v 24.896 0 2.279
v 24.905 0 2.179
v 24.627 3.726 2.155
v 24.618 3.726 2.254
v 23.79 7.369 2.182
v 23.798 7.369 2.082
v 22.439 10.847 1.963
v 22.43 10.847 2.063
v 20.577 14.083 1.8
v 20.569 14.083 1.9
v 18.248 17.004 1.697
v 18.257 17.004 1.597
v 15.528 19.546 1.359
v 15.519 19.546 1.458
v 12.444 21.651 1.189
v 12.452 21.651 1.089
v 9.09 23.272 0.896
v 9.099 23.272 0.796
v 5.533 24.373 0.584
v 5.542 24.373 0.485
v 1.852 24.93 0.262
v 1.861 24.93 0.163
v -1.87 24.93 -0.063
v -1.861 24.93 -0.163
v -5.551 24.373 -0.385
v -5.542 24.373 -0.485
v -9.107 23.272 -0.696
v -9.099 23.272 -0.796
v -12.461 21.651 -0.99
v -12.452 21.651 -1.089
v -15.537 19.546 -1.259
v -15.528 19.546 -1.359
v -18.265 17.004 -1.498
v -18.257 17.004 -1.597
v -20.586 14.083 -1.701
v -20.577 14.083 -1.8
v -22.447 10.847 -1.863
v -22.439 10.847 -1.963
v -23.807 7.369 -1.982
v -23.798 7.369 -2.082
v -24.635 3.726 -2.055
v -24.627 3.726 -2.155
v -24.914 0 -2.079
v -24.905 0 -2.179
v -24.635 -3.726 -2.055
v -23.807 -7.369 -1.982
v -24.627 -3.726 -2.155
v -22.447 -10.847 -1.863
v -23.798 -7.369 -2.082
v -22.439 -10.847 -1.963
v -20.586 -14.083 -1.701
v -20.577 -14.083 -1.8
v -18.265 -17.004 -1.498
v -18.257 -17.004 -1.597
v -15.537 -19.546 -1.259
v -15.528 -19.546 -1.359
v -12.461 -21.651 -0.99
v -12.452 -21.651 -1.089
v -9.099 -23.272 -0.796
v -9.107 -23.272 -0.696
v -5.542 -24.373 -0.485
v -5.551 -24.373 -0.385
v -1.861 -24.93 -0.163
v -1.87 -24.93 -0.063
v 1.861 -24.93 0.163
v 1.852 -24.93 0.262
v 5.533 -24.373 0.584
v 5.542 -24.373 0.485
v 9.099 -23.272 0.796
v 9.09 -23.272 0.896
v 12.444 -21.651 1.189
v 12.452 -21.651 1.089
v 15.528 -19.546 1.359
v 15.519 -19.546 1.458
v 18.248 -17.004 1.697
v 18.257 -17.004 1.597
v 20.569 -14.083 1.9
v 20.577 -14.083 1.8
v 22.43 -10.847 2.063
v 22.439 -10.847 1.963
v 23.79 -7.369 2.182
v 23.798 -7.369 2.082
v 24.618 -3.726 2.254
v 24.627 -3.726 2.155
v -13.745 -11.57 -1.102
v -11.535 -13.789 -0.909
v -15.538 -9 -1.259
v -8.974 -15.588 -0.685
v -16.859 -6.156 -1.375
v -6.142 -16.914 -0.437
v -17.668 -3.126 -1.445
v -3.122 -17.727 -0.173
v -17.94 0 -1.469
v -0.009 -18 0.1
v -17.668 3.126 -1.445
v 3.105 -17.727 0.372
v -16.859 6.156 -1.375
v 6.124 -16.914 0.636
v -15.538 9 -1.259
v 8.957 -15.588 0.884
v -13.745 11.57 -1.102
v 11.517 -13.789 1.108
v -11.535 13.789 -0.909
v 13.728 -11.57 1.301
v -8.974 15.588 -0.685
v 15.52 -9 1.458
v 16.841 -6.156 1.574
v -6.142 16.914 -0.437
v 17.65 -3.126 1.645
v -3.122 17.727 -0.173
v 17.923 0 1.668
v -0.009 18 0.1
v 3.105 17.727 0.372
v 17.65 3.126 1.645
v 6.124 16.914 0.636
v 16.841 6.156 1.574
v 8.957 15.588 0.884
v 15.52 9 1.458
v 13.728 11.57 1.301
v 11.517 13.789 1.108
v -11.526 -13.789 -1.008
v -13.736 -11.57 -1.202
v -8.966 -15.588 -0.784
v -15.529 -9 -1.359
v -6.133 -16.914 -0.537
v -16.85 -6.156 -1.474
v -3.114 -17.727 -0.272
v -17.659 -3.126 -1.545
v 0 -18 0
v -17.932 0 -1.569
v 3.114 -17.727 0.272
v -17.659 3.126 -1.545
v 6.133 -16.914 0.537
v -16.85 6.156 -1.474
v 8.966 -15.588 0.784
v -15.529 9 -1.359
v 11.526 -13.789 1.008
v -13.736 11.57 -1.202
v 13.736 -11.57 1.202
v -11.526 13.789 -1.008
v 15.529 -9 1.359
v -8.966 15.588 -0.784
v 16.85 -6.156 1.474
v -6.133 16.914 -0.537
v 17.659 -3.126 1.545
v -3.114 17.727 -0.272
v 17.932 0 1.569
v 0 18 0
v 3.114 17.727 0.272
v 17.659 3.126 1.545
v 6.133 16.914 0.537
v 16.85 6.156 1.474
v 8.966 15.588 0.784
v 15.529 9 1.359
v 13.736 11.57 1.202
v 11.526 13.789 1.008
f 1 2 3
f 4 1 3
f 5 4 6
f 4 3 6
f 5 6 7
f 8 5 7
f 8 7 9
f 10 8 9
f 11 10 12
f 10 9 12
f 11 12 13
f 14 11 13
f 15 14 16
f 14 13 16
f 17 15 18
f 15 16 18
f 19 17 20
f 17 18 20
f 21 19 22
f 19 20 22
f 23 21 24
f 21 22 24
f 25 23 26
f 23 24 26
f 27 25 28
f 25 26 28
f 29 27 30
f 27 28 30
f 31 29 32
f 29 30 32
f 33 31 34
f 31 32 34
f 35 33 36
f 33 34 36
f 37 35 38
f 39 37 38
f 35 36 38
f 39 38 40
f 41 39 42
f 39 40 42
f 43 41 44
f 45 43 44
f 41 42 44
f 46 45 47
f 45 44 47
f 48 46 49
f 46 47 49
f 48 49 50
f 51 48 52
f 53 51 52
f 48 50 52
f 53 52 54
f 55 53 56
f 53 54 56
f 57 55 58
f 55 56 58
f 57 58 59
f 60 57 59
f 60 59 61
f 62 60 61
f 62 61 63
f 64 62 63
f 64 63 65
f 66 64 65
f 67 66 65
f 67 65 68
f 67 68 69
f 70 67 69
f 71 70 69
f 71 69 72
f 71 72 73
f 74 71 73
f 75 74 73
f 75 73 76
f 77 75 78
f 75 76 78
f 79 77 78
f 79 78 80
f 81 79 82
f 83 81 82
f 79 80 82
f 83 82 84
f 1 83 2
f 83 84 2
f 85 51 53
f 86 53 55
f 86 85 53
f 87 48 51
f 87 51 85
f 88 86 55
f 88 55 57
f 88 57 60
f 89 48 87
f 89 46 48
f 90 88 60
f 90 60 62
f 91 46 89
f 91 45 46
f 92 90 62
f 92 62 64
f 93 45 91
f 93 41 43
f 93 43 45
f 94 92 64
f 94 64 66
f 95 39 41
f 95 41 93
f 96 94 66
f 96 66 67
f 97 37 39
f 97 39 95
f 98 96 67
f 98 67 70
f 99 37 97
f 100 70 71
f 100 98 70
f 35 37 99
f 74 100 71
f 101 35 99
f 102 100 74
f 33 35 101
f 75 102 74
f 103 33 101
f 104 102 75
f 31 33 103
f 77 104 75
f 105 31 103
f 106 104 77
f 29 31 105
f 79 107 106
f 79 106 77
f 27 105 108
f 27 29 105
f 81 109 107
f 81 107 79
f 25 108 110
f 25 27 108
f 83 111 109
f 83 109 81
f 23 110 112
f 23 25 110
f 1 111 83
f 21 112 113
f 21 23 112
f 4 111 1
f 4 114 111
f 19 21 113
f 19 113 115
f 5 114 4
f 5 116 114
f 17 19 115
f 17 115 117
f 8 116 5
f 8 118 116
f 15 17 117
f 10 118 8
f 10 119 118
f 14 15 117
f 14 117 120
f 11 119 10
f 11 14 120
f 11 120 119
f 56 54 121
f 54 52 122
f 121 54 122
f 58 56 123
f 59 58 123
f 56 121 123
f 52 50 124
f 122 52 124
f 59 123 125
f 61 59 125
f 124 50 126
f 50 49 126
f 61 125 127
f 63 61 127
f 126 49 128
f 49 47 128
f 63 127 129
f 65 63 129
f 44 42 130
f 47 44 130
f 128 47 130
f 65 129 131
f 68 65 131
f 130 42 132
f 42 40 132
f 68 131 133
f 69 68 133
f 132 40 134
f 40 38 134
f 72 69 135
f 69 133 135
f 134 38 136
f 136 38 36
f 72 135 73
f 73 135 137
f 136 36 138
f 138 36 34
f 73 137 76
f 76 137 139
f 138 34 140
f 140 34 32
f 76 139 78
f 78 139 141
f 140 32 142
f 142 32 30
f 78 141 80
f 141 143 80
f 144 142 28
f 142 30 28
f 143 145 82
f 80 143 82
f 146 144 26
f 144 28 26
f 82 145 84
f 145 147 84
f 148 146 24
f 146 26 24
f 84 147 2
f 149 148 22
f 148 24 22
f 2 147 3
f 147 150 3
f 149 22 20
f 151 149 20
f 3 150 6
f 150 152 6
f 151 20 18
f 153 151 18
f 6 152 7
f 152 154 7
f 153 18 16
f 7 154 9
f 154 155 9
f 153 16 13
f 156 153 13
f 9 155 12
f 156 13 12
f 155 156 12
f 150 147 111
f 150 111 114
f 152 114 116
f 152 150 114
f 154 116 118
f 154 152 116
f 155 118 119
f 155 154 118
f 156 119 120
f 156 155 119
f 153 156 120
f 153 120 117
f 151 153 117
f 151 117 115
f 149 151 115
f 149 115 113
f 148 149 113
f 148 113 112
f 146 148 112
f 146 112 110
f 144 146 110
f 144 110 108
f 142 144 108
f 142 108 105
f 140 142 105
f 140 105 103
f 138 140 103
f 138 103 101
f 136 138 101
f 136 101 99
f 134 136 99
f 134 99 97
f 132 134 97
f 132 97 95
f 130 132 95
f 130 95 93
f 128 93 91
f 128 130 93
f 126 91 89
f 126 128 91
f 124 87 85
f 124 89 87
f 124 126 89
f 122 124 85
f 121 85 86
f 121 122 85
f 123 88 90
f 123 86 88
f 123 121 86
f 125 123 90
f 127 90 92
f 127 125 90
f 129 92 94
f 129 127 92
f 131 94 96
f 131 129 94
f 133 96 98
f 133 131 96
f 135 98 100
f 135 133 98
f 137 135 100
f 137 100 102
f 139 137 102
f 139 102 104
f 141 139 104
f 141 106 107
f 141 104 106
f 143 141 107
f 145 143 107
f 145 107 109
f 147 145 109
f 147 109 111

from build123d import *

# Parameters (mm, degrees)
CYLINDER001_R       = 18
CYLINDER001_DEPTH   = 10
CYLINDER_R          = 25
CYLINDER_DEPTH      = 0.1
CUT_PLACEMENT_ANGLE = 5


with BuildPart() as cylinder001:
    # Cylinder001 → Cylinder001 (new body)
    with BuildSketch(Plane.XY):
        Circle(CYLINDER001_R)
    extrude(amount=CYLINDER001_DEPTH)


with BuildPart() as cut:
    # Cylinder → Cylinder (new body)
    with BuildSketch(Plane.XY):
        Circle(CYLINDER_R)
    extrude(amount=CYLINDER_DEPTH)

    # Cut: cut Cylinder001
    add(cylinder001.part, mode=Mode.SUBTRACT)


with BuildPart() as cut_1:
    # Cut placement: moved
    add(cut.part.rotate(Axis((0, 0, 0), (0, -1, 0)), CUT_PLACEMENT_ANGLE))


solid = cut_1.part
